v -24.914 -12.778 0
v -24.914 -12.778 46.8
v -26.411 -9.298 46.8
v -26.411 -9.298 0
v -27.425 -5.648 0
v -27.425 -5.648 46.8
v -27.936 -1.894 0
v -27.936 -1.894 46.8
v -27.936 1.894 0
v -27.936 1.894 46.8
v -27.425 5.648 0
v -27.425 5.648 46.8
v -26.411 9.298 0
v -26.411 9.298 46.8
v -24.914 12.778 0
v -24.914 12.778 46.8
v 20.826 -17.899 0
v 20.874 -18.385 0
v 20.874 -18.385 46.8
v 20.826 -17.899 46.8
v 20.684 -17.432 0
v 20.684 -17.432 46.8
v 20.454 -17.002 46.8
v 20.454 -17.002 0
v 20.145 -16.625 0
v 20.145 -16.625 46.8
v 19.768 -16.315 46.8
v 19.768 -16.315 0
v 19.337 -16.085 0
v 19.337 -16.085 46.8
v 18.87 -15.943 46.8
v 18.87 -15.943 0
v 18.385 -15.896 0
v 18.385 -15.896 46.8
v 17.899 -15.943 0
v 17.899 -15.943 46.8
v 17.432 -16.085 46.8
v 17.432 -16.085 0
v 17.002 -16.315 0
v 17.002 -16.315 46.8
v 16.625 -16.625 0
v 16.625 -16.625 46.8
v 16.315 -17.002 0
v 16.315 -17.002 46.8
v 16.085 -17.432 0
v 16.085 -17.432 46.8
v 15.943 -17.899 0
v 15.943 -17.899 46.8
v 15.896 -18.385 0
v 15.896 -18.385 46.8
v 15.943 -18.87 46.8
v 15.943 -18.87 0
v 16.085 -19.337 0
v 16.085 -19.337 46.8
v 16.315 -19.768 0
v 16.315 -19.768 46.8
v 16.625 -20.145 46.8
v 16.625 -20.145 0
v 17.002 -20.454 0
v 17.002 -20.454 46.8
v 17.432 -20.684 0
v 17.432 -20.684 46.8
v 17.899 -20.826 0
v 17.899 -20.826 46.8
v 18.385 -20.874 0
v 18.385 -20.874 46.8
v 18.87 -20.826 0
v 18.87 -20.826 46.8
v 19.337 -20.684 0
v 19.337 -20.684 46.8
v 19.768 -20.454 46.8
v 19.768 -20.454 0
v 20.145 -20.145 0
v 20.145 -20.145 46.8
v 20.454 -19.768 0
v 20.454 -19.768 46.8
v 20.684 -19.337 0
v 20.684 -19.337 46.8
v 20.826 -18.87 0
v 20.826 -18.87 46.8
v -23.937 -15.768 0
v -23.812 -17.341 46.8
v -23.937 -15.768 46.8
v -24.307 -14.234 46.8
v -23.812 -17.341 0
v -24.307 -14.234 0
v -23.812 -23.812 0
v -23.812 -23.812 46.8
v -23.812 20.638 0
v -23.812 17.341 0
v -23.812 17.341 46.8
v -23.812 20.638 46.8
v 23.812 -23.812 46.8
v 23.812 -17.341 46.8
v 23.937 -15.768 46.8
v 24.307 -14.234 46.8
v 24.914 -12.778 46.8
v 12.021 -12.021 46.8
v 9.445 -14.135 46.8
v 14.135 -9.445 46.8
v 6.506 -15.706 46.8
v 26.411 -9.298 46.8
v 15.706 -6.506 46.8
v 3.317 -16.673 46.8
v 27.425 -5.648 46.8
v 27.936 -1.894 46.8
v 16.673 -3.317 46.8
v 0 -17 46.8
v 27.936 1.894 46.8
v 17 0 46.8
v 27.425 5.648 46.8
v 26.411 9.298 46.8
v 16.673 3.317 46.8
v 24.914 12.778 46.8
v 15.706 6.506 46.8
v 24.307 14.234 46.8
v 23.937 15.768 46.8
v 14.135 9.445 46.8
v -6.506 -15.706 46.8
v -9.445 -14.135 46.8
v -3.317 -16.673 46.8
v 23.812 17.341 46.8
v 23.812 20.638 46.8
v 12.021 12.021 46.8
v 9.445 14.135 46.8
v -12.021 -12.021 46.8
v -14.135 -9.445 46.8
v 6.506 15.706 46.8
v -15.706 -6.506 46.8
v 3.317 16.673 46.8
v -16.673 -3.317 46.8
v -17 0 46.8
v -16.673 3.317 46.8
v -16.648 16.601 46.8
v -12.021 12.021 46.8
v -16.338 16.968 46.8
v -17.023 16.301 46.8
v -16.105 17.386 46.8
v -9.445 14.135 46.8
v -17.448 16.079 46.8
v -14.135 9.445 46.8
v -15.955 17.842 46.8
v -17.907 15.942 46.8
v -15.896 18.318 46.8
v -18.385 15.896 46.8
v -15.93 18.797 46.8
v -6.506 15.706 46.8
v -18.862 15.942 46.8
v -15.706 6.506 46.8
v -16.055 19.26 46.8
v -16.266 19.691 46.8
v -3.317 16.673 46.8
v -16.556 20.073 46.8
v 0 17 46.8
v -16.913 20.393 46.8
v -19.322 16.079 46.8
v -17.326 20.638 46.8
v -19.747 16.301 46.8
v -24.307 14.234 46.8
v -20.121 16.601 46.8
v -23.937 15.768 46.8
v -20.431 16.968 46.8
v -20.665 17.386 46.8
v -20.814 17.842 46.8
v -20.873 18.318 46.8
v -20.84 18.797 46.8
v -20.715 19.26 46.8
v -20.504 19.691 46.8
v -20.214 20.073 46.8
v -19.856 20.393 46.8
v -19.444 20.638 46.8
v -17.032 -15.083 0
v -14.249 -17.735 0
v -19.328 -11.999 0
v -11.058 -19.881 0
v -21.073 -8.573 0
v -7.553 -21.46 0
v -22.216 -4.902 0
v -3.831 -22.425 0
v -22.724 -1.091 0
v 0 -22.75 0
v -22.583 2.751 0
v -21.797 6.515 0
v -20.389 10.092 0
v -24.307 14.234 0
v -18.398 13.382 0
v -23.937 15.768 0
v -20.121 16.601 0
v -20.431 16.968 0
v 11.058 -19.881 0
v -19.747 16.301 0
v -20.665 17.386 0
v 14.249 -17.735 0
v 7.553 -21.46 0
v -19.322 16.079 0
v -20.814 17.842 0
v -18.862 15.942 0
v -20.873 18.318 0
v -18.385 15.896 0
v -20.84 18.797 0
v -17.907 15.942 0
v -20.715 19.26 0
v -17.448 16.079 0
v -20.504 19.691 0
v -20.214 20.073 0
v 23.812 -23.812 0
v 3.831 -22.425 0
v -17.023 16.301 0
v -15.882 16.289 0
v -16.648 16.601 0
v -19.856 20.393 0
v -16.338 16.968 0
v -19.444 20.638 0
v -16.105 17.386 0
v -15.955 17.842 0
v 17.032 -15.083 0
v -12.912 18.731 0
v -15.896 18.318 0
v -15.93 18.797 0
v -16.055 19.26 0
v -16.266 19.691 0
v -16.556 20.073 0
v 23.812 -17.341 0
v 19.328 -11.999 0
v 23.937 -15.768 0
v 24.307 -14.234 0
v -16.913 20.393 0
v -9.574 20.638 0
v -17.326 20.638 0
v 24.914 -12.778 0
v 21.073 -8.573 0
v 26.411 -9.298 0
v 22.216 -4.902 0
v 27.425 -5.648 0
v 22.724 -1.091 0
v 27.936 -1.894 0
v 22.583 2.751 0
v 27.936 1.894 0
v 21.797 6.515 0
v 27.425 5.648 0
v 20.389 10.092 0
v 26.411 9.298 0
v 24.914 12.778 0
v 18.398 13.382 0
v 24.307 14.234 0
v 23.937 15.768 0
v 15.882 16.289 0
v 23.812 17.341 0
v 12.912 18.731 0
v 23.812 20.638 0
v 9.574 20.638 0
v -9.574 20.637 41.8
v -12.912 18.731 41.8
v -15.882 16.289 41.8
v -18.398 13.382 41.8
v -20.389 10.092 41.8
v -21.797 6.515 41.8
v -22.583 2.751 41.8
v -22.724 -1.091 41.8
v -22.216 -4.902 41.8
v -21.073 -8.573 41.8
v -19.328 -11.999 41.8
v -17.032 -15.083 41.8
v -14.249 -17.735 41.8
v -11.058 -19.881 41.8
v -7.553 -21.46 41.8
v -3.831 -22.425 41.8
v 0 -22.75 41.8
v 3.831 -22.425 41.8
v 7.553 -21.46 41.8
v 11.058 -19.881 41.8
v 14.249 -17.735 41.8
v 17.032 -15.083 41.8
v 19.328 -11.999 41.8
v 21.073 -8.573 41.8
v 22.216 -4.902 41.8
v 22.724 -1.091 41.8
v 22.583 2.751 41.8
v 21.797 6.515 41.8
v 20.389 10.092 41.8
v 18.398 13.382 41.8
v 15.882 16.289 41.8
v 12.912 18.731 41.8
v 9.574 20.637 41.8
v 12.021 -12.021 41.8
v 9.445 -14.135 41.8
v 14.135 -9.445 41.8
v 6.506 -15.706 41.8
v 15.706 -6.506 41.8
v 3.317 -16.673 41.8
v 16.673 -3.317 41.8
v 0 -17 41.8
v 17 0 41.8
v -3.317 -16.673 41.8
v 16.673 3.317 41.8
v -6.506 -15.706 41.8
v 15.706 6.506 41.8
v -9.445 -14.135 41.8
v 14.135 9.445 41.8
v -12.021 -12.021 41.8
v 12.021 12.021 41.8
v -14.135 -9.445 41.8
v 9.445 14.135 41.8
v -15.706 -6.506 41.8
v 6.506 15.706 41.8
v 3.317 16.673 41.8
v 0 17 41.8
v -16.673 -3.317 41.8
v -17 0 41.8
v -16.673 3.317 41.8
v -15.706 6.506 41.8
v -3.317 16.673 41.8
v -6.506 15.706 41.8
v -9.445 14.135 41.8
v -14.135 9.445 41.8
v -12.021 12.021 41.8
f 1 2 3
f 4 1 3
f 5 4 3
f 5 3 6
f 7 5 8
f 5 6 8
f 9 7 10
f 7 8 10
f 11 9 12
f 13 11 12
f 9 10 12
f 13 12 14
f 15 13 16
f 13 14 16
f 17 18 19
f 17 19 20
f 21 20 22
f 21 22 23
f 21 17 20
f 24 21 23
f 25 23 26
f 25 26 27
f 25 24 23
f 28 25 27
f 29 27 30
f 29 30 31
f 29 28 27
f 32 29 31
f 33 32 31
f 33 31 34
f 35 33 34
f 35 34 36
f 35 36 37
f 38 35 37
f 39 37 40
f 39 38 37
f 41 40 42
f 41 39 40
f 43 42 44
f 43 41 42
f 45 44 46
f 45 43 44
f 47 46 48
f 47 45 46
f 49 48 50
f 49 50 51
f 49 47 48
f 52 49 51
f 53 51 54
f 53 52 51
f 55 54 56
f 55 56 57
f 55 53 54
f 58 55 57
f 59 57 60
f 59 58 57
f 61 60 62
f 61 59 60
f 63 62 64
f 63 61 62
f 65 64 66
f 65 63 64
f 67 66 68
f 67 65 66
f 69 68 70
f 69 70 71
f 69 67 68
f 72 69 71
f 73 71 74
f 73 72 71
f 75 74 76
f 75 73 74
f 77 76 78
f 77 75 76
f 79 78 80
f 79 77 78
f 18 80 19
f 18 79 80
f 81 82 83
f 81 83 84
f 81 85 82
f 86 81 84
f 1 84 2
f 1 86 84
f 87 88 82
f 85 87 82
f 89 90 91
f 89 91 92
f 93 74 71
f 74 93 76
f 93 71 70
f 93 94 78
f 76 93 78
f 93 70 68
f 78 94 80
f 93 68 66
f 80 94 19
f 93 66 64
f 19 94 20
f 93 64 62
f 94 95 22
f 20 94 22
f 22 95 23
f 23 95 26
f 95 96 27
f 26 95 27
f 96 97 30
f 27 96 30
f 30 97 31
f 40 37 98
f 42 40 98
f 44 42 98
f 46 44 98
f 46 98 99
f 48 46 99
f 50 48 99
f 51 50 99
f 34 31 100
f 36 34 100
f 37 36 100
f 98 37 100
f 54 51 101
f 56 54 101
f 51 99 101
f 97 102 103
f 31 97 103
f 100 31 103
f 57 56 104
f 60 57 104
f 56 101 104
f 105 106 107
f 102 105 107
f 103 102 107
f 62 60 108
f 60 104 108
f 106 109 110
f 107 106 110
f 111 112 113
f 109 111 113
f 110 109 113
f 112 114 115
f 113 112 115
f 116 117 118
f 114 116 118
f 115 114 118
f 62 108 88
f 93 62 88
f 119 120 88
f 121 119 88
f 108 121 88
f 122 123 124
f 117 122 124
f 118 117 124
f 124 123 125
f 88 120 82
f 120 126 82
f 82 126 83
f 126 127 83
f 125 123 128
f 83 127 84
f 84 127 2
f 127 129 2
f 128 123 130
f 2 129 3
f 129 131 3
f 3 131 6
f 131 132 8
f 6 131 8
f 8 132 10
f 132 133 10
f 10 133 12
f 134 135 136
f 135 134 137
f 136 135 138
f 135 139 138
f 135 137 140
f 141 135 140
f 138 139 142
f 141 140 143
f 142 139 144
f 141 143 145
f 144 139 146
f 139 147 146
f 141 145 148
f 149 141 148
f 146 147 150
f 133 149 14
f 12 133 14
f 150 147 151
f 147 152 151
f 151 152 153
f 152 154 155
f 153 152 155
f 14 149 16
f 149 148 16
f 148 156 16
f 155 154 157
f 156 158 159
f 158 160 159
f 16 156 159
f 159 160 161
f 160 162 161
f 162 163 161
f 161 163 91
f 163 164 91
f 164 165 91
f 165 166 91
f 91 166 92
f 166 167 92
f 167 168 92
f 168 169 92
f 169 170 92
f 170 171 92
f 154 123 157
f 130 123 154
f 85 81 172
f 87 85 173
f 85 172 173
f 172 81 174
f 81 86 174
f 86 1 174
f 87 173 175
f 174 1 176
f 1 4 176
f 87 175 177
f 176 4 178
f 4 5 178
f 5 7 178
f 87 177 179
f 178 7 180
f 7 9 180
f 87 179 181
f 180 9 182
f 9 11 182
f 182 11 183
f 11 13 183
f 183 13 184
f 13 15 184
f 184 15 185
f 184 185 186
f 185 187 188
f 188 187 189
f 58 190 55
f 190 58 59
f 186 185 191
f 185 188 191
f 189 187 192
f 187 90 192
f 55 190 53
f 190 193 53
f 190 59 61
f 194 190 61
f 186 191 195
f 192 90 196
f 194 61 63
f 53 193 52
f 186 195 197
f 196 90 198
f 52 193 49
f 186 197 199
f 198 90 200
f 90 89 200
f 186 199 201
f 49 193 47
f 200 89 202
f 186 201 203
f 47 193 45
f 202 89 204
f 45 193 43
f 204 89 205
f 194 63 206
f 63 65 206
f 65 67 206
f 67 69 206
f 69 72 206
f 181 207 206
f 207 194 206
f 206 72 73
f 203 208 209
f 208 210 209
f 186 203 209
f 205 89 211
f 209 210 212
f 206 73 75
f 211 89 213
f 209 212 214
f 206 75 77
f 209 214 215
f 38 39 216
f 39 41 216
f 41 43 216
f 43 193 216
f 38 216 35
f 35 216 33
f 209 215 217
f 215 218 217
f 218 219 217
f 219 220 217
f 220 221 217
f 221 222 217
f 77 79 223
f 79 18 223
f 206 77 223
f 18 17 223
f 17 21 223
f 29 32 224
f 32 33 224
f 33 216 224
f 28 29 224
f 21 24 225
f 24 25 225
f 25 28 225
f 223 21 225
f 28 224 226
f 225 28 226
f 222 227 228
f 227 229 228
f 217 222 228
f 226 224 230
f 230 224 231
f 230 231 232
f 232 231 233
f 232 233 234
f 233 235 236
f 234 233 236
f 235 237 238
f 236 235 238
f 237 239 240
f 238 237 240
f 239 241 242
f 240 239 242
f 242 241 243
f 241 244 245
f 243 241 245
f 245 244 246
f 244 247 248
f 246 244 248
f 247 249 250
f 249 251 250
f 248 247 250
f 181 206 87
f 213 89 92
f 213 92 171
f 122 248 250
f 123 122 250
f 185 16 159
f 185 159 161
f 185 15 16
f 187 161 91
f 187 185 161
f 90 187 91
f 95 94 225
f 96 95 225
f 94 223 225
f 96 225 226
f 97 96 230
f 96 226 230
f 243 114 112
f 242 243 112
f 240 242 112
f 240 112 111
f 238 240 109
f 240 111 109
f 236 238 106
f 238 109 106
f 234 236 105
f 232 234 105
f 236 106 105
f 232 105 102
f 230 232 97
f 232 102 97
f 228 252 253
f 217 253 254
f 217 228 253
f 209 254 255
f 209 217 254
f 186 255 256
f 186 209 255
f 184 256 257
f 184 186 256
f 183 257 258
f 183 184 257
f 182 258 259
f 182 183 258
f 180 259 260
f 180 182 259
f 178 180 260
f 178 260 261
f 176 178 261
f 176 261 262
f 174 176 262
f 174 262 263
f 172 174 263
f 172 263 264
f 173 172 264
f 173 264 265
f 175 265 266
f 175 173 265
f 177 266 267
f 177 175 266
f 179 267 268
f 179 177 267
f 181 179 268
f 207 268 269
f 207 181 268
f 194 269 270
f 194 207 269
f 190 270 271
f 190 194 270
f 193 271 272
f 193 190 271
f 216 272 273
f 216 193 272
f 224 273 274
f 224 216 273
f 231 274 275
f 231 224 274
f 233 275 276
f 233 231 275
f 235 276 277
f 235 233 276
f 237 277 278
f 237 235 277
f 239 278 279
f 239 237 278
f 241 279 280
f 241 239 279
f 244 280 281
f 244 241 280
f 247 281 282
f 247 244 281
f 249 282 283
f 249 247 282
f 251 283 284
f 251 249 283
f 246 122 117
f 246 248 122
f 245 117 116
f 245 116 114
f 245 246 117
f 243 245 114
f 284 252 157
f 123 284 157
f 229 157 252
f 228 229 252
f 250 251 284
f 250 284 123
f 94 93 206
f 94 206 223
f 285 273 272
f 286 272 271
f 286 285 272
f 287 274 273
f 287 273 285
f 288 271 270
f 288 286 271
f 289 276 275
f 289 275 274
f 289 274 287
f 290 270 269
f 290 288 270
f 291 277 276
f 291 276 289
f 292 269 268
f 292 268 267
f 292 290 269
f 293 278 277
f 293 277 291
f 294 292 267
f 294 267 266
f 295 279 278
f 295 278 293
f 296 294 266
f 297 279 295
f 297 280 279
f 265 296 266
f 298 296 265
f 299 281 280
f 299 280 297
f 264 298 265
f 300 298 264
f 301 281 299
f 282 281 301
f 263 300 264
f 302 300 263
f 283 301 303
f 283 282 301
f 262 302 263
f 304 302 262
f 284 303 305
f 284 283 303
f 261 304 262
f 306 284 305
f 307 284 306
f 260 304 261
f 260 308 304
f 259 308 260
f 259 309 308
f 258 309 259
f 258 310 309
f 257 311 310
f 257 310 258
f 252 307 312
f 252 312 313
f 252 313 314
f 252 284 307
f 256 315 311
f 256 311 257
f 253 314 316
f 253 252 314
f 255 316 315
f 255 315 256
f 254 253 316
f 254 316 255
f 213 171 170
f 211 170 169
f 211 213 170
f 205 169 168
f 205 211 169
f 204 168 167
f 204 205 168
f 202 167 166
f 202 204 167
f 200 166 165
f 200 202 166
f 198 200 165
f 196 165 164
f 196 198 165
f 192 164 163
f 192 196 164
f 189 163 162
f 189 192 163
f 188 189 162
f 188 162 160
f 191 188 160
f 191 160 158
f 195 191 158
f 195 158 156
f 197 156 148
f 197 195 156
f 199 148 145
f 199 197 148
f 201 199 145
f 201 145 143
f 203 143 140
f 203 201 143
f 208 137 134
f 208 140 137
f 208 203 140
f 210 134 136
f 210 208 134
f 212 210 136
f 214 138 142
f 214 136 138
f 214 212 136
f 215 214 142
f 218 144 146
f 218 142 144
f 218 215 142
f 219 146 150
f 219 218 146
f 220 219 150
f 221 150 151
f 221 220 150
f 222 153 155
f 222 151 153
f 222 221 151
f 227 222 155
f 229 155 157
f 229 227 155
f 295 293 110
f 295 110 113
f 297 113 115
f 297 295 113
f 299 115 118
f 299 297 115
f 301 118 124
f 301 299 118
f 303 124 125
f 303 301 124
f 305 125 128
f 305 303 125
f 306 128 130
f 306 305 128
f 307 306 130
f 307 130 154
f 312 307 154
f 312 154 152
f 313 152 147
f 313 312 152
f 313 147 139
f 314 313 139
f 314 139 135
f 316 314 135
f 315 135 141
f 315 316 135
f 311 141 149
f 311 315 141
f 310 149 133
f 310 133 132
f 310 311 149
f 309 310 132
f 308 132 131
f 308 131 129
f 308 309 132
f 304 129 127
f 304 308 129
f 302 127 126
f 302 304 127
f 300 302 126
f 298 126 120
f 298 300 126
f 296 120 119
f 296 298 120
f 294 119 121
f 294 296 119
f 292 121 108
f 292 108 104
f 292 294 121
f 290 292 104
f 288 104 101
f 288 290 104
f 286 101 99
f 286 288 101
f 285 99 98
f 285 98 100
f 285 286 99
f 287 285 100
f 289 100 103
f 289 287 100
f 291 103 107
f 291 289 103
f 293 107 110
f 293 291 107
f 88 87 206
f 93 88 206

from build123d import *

# Parameters (mm, degrees)
SKETCH1_W               = 47.625
SKETCH1_H               = 47.625
SKETCH1_R               = 22.75
SKETCH1_R_2             = 2.4892
BOSS_EXTRUDE1_DEPTH     = 46.8
CUT_EXTRUDE1_DEPTH      = 58.656832314
CUT_EXTRUDE1_DEPTH_BACK = 58.656832314
SKETCH2_W               = 47.625
SKETCH2_H               = 3.175
BOSS_EXTRUDE2_DEPTH     = 46.8
FILLET1_R               = 10
BOSS_EXTRUDE3_START     = -5
SKETCH4_R               = 17
BOSS_EXTRUDE3_DEPTH     = 5


with BuildPart() as part:
    # Sketch1 → Boss-Extrude1 (new body)
    with BuildSketch(Plane.XY):
        Rectangle(SKETCH1_W, SKETCH1_H)
        Circle(SKETCH1_R, mode=Mode.SUBTRACT)
        with Locations((-18.384776311, 18.384776311)):
            Circle(SKETCH1_R_2, mode=Mode.SUBTRACT)
        with Locations((18.384776311, -18.384776311)):
            Circle(SKETCH1_R_2, mode=Mode.SUBTRACT)
    extrude(amount=BOSS_EXTRUDE1_DEPTH)

    # Sketch2 → Cut-Extrude1 (cut, two sides: drawn at the far end of the back side and taken through both)
    with BuildSketch(Plane.XY.offset(46.8).offset(-CUT_EXTRUDE1_DEPTH_BACK)):
        with Locations((0, 22.225)):
            Rectangle(SKETCH2_W, SKETCH2_H)
    extrude(amount=CUT_EXTRUDE1_DEPTH + CUT_EXTRUDE1_DEPTH_BACK, mode=Mode.SUBTRACT)

    # Sketch3 → Boss-Extrude2 (add)
    with BuildSketch(Plane.XY.offset(46.8)):
        with BuildLine():
            Line((23.8125, -14.729726533), (23.8125, 14.729726533))
            ThreePointArc((23.8125, 14.729726533), (28, 0), (23.8125, -14.729726533))
        make_face()
        with BuildLine():
            Line((-23.8125, 14.729726533), (-23.8125, -14.729726533))
            ThreePointArc((-23.8125, -14.729726533), (-28, 0), (-23.8125, 14.729726533))
        make_face()
    extrude(amount=-BOSS_EXTRUDE2_DEPTH)

    # Fillet1
    fillet1_edges = [part.edges().sort_by_distance(p)[0] for p in [
        (-23.8125, -14.729726533, 23.4),
        (-23.8125, 14.729726533, 23.4),
        (23.8125, 14.729726533, 23.4),
        (23.8125, -14.729726533, 23.4),
    ]]
    fillet(fillet1_edges, radius=FILLET1_R)

    # Sketch4 → Boss-Extrude3 (add)
    with BuildSketch(Plane.XY.offset(46.8).offset(BOSS_EXTRUDE3_START)):
        with BuildLine():
            Line((-9.573718909, 20.6375), (9.573718909, 20.6375))
            ThreePointArc((9.573718909, 20.6375), (0, -22.75), (-9.573718909, 20.6375))
        make_face()
        Circle(SKETCH4_R, mode=Mode.SUBTRACT)
    extrude(amount=BOSS_EXTRUDE3_DEPTH)


solid = part.part
